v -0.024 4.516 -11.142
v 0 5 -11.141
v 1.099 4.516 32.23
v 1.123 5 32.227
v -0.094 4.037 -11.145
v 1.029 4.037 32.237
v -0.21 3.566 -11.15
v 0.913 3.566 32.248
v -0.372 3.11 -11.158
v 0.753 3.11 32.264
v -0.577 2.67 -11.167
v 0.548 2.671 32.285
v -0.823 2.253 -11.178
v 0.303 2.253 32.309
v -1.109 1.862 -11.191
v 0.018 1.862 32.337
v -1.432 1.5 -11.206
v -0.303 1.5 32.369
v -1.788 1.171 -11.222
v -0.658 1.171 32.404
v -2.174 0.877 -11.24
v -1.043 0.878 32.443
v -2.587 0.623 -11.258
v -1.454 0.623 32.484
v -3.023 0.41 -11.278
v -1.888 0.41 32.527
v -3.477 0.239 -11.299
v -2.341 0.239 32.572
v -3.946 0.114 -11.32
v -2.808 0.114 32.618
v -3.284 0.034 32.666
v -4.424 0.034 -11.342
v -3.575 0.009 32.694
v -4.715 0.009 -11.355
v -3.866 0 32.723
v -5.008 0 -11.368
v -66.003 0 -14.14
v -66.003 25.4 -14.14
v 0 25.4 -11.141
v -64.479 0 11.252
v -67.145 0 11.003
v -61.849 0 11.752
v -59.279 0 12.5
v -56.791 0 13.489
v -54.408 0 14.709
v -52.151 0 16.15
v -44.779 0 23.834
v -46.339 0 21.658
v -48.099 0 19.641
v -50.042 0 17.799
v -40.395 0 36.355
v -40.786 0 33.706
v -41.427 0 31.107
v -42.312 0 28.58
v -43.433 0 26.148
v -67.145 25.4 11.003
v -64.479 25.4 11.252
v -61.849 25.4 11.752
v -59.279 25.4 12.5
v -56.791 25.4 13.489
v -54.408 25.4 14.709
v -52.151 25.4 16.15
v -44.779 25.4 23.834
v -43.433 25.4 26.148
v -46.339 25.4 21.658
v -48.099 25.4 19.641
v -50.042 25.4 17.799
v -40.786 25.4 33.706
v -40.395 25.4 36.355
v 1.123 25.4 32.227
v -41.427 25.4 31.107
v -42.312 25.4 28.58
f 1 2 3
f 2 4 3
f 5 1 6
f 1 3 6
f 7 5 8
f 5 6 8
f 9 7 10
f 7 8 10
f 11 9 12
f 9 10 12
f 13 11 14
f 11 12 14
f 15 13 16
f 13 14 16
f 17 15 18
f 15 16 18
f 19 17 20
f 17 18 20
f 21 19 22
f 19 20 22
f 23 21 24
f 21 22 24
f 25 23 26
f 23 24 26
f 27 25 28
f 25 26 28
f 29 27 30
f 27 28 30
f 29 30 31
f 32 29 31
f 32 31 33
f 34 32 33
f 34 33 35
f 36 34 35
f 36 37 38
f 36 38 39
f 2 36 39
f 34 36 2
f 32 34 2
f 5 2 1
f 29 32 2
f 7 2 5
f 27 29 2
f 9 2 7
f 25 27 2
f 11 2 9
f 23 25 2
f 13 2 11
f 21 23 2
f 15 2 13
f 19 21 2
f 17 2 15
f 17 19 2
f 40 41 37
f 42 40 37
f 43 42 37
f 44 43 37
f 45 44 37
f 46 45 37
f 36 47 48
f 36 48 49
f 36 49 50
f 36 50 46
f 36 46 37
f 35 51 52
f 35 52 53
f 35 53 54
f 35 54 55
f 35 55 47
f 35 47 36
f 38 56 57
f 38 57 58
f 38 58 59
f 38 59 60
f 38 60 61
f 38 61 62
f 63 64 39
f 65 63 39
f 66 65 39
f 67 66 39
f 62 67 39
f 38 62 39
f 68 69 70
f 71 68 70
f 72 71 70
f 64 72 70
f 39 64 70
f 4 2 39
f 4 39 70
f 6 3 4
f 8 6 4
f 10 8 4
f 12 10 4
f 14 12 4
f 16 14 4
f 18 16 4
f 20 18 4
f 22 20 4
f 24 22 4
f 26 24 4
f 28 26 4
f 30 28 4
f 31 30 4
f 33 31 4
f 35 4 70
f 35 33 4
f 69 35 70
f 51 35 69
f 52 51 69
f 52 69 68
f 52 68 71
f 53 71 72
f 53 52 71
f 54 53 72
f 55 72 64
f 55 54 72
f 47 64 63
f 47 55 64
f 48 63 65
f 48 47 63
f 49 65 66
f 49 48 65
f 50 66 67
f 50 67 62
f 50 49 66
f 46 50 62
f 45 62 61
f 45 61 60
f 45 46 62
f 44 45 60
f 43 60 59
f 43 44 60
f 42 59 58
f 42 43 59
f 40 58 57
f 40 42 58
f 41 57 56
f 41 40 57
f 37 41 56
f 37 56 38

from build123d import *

# Parameters (mm, degrees)
F1_DEPTH = 25.4
F2_R     = 5


with BuildPart() as f1:
    # F0 (on Front) → F1 (new body)
    with BuildSketch(Plane.XZ):
        with BuildLine():
            ThreePointArc((-40.395132, 36.354515), (-49.048411, 18.696662), (-67.145093, 11.003214))
            Line((-67.145093, 11.003214), (-66.002764, -14.139596))
            Line((-66.002764, -14.139596), (0, -11.140851))
            Line((0, -11.140851), (1.122797, 32.227423))
            Line((1.122797, 32.227423), (-40.395132, 36.354515))
        make_face()
    extrude(amount=-F1_DEPTH)

    # F2
    f2_edges = [f1.edges().sort_by_distance(p)[0] for p in [
        (0.561399, 0, 10.543286),
    ]]
    fillet(f2_edges, radius=F2_R)


solid = f1.part
